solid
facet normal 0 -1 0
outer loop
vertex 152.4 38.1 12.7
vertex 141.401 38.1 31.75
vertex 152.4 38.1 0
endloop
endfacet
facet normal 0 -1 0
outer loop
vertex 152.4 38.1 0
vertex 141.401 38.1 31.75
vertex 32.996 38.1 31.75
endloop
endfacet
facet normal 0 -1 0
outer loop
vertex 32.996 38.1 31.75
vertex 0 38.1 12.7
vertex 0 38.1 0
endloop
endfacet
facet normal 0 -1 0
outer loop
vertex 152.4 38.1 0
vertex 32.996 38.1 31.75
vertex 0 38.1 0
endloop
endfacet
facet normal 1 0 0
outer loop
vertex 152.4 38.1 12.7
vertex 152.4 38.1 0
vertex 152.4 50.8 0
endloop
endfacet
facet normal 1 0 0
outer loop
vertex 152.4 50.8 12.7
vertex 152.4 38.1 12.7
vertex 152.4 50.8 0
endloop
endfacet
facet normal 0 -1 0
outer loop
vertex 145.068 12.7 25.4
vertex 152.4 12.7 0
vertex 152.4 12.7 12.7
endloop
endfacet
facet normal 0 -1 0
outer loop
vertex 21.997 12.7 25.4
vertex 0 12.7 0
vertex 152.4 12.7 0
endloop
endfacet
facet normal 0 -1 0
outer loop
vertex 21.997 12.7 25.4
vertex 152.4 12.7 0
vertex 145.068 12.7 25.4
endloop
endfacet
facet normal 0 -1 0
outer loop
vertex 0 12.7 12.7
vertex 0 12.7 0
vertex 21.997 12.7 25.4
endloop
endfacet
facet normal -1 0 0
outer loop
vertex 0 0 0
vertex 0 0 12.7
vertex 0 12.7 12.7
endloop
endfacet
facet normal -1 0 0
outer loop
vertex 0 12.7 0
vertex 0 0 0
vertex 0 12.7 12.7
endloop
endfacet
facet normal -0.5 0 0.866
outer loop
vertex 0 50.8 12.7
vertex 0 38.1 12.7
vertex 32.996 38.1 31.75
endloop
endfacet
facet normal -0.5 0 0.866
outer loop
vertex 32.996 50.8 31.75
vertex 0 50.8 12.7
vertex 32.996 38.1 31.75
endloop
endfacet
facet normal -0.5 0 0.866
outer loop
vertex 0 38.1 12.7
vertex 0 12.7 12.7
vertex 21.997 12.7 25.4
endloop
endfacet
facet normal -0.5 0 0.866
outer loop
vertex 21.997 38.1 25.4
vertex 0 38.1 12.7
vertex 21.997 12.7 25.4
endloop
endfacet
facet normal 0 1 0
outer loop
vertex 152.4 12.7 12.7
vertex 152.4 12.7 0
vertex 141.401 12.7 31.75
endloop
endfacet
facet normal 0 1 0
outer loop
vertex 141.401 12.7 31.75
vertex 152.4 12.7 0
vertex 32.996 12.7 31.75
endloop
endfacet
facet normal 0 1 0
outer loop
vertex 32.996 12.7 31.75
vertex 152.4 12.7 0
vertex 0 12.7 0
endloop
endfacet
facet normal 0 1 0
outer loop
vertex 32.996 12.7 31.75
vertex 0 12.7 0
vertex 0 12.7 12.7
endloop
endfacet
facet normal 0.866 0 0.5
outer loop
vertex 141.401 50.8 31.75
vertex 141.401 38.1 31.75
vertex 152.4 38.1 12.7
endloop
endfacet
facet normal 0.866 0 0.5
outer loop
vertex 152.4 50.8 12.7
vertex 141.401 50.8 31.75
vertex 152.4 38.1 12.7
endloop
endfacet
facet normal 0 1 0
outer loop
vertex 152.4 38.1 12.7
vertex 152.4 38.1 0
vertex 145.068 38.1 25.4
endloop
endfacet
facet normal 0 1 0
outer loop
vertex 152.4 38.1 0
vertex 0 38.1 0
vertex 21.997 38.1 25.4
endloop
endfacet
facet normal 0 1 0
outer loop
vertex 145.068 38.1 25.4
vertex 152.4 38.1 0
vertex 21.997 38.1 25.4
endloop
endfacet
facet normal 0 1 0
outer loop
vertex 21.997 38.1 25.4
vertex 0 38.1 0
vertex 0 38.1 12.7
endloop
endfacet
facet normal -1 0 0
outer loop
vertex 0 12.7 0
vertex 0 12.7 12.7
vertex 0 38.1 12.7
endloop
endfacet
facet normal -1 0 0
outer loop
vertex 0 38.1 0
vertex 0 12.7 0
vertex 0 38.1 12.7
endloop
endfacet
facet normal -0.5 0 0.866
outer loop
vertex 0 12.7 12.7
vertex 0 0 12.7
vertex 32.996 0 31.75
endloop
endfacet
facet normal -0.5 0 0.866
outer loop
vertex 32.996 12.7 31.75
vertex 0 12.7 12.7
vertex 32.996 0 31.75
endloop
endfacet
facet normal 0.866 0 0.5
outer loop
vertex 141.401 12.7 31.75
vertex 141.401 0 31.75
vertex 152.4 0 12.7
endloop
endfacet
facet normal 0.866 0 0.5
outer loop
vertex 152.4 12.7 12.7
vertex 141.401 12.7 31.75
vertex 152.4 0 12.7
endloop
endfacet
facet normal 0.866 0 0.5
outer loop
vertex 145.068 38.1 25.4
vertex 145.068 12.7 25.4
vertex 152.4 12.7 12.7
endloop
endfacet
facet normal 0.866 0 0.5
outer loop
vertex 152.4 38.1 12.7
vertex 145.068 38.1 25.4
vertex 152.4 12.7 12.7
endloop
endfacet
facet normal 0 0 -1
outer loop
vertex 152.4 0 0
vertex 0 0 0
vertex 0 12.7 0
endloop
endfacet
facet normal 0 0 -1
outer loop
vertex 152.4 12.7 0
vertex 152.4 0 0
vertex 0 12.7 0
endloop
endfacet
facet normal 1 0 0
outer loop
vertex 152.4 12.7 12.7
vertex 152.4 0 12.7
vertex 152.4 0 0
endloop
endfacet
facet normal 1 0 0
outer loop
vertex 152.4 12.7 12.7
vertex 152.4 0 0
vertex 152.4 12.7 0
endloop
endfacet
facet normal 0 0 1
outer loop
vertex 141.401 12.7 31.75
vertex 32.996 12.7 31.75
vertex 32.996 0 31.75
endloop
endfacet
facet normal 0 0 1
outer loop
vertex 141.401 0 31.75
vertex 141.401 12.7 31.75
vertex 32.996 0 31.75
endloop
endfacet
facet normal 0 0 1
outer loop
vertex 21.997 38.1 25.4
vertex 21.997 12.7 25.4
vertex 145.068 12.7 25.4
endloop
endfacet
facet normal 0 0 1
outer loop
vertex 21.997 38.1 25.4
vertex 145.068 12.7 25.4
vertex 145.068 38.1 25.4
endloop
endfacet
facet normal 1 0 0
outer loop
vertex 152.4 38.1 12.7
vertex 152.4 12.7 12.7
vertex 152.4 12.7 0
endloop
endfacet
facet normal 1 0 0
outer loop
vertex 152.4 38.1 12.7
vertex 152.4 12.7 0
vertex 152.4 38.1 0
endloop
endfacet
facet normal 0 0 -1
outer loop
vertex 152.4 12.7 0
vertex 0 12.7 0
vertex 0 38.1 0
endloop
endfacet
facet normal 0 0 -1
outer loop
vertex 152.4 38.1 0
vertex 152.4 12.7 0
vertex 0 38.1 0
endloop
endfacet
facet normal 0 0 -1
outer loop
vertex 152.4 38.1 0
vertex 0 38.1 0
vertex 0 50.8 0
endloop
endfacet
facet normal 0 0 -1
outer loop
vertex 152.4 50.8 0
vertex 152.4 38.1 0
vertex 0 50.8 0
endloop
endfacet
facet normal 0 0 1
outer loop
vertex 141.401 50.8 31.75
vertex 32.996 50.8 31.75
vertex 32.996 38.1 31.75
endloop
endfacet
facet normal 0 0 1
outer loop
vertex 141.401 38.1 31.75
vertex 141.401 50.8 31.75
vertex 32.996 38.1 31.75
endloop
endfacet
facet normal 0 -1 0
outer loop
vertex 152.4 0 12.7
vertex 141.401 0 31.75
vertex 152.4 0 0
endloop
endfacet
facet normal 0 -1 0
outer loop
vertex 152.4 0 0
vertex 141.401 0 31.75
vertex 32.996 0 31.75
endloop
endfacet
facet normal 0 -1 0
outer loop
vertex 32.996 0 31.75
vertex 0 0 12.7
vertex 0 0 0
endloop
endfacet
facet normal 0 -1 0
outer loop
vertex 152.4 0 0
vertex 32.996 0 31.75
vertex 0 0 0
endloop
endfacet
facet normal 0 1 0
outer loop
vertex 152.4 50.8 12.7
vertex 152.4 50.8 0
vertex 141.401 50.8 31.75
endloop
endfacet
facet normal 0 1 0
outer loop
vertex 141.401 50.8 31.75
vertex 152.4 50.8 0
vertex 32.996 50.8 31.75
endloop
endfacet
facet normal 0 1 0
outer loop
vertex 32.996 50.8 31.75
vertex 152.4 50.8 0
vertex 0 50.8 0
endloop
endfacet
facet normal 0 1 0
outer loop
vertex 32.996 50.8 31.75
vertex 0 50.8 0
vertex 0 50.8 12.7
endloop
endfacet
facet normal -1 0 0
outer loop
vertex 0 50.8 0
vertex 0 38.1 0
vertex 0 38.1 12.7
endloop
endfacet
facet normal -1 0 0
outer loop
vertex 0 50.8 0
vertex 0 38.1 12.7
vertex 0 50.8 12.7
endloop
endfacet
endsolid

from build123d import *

# Parameters (mm, degrees)
F1_DEPTH = 152.4
F0_W     = 25.4
F0_H     = 25.4
F2_DEPTH = 152.4
F4_DEPTH = 50.801


with BuildPart() as f1:
    # F0 (on Right) → F1 (new body)
    with BuildSketch(Plane.YZ):
        Polygon((0, 31.75), (0, 0), (12.7, 0), (12.7, 25.4), (12.7, 31.75), align=None)
        Polygon((38.1, 25.4), (38.1, 0), (50.8, 0), (50.8, 31.75), (38.1, 31.75), align=None)
    extrude(amount=F1_DEPTH)


with BuildPart() as f2:
    # F0 (on Right) → F2 (new body, through all)
    with BuildSketch(Plane.YZ):
        with Locations((25.4, 12.7)):
            Rectangle(F0_W, F0_H)
    extrude(amount=F2_DEPTH)


with BuildPart() as f4_tool:
    # F3 (on face) → F4 (new body, through all)
    with BuildSketch(Plane.XZ):
        Polygon((141.401477, 31.75), (152.4, 12.7), (152.4, 31.75), align=None)
        Polygon((0, 31.75), (0, 12.7), (32.995568, 31.75), align=None)
    extrude(amount=-F4_DEPTH)


with BuildPart() as f1_1:
    add(f1.part)

    # F4: cut by f4_tool
    add(f4_tool.part, mode=Mode.SUBTRACT)


with BuildPart() as f2_1:
    add(f2.part)

    # F4: cut by f4_tool
    add(f4_tool.part, mode=Mode.SUBTRACT)


solid = Compound([f1_1.part, f2_1.part])
